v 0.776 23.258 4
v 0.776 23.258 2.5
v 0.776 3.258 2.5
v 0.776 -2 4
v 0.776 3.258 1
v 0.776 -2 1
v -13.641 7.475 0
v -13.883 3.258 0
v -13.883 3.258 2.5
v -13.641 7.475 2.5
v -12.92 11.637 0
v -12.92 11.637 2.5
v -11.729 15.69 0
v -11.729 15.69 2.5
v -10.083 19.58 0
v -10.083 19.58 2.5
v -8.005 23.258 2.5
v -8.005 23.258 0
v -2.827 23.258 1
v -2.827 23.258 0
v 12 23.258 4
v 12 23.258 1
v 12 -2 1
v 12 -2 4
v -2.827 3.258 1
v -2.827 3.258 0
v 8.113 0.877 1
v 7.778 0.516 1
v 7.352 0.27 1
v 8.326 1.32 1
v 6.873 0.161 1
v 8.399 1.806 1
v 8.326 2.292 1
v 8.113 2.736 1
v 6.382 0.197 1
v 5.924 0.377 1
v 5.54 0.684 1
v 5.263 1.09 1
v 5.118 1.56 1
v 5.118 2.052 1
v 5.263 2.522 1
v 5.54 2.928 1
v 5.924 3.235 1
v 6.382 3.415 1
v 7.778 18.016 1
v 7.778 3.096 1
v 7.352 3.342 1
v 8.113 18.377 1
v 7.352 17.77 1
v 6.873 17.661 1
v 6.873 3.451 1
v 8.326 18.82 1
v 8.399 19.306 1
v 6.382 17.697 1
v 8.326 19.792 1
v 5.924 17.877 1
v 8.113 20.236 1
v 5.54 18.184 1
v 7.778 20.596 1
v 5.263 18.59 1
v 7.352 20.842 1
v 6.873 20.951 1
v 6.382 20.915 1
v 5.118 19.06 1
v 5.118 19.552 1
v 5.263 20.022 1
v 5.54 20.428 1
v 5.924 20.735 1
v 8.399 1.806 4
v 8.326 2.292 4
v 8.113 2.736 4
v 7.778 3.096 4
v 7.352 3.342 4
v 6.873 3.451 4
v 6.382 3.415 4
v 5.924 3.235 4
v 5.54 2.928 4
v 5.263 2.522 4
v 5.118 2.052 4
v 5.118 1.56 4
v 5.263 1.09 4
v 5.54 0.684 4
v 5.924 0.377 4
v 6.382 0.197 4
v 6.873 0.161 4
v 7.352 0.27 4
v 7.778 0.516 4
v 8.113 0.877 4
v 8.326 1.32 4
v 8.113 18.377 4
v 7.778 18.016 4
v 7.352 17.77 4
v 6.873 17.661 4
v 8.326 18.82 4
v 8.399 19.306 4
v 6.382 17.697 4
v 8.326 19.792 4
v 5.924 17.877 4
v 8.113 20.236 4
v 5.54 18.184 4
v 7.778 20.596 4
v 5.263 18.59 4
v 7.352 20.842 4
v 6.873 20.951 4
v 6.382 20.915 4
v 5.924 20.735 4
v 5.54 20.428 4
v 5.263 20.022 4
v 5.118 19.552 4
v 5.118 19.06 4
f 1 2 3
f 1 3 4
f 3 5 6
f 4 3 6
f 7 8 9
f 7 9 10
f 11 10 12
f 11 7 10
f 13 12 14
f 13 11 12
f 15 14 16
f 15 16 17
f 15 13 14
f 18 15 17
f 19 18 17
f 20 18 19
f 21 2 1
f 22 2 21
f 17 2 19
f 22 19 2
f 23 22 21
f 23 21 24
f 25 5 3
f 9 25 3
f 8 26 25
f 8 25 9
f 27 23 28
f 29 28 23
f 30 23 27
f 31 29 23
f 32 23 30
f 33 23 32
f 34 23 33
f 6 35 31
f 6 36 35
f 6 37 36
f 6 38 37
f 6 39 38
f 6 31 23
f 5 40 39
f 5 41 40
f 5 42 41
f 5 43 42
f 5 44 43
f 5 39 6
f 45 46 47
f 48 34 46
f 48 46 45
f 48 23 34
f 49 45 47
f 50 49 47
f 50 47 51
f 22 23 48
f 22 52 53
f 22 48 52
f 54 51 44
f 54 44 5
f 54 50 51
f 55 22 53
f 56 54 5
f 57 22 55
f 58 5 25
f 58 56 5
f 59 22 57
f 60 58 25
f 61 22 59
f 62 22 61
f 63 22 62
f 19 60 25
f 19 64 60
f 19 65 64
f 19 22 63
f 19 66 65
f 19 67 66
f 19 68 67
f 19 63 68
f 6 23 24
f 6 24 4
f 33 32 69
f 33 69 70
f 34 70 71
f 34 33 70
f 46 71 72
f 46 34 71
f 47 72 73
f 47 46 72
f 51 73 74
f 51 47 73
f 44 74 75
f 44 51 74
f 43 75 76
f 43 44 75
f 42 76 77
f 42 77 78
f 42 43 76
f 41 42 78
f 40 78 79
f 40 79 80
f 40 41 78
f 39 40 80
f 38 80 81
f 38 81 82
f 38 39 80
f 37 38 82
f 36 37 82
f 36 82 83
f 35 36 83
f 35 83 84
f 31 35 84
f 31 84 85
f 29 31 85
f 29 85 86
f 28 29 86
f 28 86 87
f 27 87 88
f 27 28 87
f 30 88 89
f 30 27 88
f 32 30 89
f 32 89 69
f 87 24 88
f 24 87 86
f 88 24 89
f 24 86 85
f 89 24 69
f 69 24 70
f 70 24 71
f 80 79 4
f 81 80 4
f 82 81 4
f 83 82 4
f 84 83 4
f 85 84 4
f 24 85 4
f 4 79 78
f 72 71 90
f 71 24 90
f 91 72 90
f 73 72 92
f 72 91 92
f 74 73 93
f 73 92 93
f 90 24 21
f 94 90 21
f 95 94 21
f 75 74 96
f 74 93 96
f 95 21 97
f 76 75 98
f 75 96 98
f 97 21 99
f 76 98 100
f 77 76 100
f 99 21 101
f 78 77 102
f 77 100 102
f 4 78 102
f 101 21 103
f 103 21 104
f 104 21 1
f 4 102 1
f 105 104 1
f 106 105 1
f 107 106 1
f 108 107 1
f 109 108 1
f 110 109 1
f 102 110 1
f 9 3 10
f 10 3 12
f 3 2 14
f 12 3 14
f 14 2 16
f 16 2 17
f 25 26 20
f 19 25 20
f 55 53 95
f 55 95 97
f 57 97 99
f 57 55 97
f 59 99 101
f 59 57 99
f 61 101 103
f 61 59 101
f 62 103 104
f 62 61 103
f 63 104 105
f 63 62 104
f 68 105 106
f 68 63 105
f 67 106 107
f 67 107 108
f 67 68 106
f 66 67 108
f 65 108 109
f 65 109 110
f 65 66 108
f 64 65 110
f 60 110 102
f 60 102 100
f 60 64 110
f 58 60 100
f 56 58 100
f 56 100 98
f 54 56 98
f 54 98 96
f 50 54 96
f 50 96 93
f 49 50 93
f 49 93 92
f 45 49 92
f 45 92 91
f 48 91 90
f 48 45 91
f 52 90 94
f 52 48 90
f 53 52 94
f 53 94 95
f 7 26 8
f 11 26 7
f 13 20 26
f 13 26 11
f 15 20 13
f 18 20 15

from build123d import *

# Parameters (mm, degrees)
SKETCH1_R           = 1.65
BOSS_EXTRUDE1_DEPTH = 2.5
SKETCH5_R           = 1.65
BOSS_EXTRUDE2_DEPTH = 1.5
CUT_EXTRUDE3_DEPTH  = 1


with BuildPart() as part:
    # Sketch1 → Boss-Extrude1 (new body)
    with BuildSketch(Plane.XY):
        with BuildLine():
            Line((-8.004553297, 23.25769142), (12, 23.25769142))
            Line((12, 23.25769142), (12, 0))
            Line((12, 0), (12, -2))
            Line((12, -2), (0.775731814, -2))
            Line((0.775731814, -2), (0.775731814, 0))
            Line((0.775731814, 0), (0.775731814, 3.25769142))
            Line((0.775731814, 3.25769142), (-13.882660061, 3.25769142))
            ThreePointArc((-13.882660061, 3.25769142), (-12.382699641, 13.680648524), (-8.004553297, 23.25769142))
        make_face()
        with Locations((6.74921921, 19.306101501)):
            Circle(SKETCH1_R, mode=Mode.SUBTRACT)
        with Locations((6.74921921, 1.806101501)):
            Circle(SKETCH1_R, mode=Mode.SUBTRACT)
    extrude(amount=BOSS_EXTRUDE1_DEPTH)

    # Sketch5 → Boss-Extrude2 (add)
    with BuildSketch(Plane.XY.offset(2.5)):
        Polygon((0.775731814, 3.25769142), (0.775731814, 23.25769142), (12, 23.25769142), (12, -2), (0.775731814, -2), align=None)
        with Locations((6.74921921, 19.306101501)):
            Circle(SKETCH5_R, mode=Mode.SUBTRACT)
        with Locations((6.74921921, 1.806101501)):
            Circle(SKETCH5_R, mode=Mode.SUBTRACT)
    extrude(amount=BOSS_EXTRUDE2_DEPTH)

    # Sketch6 → Cut-Extrude3 (cut)
    with BuildSketch(Plane(origin=(0, 0, 0), x_dir=(-1, 0, 0), z_dir=(0, 0, -1))):
        Polygon((-12, 23.25769142), (-12, -2), (-0.775731814, -2), (-0.775731814, 3.25769142), (2.826661011, 3.25769142), (2.826661011, 23.25769142), align=None)
    extrude(amount=-CUT_EXTRUDE3_DEPTH, mode=Mode.SUBTRACT)


solid = part.part
